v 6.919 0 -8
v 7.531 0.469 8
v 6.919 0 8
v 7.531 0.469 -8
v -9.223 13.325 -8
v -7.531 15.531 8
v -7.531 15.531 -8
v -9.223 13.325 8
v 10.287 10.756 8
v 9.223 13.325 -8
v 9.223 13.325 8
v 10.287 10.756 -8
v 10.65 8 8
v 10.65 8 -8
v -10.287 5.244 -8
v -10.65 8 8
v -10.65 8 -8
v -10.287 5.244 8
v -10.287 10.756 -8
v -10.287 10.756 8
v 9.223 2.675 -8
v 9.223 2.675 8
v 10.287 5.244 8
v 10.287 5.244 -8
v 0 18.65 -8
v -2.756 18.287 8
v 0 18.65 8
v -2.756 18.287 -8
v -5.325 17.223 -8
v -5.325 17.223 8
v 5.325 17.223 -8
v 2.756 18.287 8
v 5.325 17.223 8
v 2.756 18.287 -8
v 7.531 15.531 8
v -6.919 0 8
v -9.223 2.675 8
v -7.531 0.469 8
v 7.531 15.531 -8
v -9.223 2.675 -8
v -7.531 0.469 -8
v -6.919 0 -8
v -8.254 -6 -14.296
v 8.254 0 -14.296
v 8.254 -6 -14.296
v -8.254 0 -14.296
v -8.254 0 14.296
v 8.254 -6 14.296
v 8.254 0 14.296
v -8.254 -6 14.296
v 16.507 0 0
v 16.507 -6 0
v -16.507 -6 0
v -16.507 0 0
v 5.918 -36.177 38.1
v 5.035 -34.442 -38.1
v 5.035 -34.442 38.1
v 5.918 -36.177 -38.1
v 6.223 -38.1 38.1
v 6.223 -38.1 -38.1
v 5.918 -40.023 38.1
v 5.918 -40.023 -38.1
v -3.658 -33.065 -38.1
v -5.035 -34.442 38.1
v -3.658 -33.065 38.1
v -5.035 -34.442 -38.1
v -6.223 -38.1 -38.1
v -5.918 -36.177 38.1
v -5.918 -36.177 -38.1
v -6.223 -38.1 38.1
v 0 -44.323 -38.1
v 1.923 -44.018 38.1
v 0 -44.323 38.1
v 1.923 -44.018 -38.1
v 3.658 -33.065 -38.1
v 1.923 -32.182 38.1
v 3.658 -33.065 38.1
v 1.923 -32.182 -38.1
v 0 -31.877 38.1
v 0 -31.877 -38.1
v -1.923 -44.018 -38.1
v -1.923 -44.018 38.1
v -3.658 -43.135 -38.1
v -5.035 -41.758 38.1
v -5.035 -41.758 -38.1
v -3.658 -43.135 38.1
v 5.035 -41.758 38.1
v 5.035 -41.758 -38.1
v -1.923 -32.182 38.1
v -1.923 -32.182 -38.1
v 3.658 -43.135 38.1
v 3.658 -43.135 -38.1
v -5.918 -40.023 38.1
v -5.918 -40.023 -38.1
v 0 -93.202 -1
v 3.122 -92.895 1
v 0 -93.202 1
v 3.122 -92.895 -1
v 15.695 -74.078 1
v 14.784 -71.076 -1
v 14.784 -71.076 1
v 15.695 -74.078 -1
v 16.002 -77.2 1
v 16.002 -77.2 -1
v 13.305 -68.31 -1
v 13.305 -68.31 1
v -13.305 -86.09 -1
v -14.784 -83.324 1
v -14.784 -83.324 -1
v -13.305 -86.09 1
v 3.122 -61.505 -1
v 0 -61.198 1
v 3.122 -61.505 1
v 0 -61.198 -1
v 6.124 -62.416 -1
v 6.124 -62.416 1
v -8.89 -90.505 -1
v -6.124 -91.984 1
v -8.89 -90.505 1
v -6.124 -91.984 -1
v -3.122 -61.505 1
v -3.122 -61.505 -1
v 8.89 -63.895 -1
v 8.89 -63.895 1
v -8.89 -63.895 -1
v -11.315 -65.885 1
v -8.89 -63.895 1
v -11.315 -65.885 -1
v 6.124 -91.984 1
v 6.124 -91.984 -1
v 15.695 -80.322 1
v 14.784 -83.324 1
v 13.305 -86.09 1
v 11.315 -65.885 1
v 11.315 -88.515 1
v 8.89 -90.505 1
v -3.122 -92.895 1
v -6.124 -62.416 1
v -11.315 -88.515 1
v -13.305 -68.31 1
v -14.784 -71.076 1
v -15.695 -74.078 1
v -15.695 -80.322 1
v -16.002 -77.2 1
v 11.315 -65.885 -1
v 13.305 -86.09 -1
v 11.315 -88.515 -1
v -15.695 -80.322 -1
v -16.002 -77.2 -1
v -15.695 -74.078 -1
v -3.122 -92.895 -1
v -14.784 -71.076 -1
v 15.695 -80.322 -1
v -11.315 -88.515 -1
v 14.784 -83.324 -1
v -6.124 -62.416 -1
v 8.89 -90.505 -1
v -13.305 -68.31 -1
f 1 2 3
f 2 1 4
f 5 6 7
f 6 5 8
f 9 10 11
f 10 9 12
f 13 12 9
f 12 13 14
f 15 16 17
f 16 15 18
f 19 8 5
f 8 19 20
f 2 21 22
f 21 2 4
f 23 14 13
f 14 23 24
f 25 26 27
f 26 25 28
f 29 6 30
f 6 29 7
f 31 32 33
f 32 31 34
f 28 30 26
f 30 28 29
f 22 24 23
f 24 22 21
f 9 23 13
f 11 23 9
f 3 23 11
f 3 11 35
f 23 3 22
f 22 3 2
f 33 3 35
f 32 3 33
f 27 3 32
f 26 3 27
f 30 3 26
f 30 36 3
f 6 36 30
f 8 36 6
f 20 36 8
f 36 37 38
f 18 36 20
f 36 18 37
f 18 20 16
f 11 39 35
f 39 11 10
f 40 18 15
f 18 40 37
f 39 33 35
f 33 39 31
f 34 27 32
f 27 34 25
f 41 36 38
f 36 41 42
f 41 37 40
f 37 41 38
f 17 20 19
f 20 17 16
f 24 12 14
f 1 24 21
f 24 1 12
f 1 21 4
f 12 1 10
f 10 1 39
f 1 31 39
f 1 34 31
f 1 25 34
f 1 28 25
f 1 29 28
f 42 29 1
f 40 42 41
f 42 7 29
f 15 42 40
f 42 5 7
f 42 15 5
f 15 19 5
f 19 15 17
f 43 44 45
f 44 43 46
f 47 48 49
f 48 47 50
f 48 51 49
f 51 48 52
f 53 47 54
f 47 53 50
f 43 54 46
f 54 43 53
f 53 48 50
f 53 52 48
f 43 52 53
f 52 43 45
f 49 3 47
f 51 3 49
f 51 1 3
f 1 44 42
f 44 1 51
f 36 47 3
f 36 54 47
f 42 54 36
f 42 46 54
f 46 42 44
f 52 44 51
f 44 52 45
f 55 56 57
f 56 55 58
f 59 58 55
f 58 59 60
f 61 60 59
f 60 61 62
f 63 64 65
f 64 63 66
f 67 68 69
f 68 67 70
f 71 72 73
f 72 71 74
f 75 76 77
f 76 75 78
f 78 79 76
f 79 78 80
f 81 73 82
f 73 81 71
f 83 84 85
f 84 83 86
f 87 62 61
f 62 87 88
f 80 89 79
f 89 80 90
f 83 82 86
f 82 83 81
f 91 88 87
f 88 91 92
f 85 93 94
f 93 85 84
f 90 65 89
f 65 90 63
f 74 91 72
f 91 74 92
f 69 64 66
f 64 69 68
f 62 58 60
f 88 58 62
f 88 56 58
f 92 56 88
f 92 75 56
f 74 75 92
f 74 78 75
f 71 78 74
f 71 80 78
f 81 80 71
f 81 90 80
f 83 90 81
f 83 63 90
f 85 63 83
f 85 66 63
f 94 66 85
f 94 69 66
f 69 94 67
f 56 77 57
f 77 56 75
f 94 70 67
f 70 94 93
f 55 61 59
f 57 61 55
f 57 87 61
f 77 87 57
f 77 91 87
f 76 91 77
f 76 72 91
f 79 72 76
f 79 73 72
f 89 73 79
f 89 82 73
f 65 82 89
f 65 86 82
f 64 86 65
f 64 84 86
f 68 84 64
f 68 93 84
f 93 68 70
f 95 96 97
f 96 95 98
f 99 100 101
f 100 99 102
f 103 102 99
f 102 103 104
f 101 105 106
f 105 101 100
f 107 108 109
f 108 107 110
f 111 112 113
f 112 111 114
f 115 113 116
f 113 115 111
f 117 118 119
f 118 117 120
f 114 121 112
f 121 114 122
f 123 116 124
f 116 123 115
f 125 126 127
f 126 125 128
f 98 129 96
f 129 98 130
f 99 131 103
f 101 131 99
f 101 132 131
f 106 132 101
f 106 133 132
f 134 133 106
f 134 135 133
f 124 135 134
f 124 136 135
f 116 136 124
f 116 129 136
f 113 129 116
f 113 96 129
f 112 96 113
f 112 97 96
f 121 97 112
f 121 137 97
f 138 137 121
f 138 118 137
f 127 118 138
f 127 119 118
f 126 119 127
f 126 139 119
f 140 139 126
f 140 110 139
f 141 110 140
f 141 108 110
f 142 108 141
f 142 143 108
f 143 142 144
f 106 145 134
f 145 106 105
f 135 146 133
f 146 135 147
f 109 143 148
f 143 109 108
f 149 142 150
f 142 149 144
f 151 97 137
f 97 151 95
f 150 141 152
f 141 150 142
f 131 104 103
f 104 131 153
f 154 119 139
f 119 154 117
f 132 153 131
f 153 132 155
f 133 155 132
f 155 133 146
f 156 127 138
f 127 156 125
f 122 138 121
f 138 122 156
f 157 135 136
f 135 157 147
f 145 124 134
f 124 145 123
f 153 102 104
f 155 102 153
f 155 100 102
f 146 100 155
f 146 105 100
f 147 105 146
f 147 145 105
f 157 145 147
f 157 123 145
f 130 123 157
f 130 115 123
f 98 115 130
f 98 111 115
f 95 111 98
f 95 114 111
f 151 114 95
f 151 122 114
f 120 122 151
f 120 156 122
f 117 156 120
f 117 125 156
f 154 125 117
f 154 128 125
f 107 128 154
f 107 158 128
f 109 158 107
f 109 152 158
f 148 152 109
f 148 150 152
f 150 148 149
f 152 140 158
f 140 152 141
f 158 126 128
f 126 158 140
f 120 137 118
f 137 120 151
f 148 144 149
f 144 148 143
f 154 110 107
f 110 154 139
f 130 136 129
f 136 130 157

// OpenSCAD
// Auto-generated by scripts/author_from_manifest.py (Phase D.3).
// Source: data/phase_d_manifest.json (sku_intent='tyco-ty7226-esfr-pendent-k168-165f').
// Do not hand-edit — regenerate from the manifest.
//
// @part tyco_ty7226_esfr_pendent_k168_165f
// @kind sprinkler_head
// @category head.pendant.k168
// @display-name "Tyco TY7226 ESFR Pendent K16.8 165°F"
// @mfg tyco_fire_protection
// @mfg-pn TY7226
// @listing UL FM
// @hazard-classes ESFR
// @price-usd 58.00
// @install-minutes 12
// @crew journeyman
// @k-factor 16.8
// @orientation pendant
// @response quick
// @temperature 165F
// @param size_in number default=0.5 label="Size" unit="in"
// @port inlet position=[0,0.014,0] direction=[0,1,0] style=NPT_threaded size_in=0.75 role=drop

size_in = 0.5;
k_factor = 16.8;

length_mm   = 76.20;
body_dia_mm = 35.56;
thread_od   = 21.3;
thread_len  = 16;
deflector_d = body_dia_mm * 0.9;

 union() {
    translate([0, thread_len/2, 0])
        cylinder(h = thread_len, d = thread_od, center = true, $fn = 24);
    translate([0, -3, 0])
        rotate([90, 0, 0])
        cylinder(h = 6, d = thread_od * 1.55, $fn = 6, center = true);
    translate([0, -length_mm/2, 0])
        cylinder(h = length_mm, d = body_dia_mm * 0.35, center = true, $fn = 20);
    translate([0, -length_mm - 1, 0])
        cylinder(h = 2, d = deflector_d, center = true, $fn = 32);
}
